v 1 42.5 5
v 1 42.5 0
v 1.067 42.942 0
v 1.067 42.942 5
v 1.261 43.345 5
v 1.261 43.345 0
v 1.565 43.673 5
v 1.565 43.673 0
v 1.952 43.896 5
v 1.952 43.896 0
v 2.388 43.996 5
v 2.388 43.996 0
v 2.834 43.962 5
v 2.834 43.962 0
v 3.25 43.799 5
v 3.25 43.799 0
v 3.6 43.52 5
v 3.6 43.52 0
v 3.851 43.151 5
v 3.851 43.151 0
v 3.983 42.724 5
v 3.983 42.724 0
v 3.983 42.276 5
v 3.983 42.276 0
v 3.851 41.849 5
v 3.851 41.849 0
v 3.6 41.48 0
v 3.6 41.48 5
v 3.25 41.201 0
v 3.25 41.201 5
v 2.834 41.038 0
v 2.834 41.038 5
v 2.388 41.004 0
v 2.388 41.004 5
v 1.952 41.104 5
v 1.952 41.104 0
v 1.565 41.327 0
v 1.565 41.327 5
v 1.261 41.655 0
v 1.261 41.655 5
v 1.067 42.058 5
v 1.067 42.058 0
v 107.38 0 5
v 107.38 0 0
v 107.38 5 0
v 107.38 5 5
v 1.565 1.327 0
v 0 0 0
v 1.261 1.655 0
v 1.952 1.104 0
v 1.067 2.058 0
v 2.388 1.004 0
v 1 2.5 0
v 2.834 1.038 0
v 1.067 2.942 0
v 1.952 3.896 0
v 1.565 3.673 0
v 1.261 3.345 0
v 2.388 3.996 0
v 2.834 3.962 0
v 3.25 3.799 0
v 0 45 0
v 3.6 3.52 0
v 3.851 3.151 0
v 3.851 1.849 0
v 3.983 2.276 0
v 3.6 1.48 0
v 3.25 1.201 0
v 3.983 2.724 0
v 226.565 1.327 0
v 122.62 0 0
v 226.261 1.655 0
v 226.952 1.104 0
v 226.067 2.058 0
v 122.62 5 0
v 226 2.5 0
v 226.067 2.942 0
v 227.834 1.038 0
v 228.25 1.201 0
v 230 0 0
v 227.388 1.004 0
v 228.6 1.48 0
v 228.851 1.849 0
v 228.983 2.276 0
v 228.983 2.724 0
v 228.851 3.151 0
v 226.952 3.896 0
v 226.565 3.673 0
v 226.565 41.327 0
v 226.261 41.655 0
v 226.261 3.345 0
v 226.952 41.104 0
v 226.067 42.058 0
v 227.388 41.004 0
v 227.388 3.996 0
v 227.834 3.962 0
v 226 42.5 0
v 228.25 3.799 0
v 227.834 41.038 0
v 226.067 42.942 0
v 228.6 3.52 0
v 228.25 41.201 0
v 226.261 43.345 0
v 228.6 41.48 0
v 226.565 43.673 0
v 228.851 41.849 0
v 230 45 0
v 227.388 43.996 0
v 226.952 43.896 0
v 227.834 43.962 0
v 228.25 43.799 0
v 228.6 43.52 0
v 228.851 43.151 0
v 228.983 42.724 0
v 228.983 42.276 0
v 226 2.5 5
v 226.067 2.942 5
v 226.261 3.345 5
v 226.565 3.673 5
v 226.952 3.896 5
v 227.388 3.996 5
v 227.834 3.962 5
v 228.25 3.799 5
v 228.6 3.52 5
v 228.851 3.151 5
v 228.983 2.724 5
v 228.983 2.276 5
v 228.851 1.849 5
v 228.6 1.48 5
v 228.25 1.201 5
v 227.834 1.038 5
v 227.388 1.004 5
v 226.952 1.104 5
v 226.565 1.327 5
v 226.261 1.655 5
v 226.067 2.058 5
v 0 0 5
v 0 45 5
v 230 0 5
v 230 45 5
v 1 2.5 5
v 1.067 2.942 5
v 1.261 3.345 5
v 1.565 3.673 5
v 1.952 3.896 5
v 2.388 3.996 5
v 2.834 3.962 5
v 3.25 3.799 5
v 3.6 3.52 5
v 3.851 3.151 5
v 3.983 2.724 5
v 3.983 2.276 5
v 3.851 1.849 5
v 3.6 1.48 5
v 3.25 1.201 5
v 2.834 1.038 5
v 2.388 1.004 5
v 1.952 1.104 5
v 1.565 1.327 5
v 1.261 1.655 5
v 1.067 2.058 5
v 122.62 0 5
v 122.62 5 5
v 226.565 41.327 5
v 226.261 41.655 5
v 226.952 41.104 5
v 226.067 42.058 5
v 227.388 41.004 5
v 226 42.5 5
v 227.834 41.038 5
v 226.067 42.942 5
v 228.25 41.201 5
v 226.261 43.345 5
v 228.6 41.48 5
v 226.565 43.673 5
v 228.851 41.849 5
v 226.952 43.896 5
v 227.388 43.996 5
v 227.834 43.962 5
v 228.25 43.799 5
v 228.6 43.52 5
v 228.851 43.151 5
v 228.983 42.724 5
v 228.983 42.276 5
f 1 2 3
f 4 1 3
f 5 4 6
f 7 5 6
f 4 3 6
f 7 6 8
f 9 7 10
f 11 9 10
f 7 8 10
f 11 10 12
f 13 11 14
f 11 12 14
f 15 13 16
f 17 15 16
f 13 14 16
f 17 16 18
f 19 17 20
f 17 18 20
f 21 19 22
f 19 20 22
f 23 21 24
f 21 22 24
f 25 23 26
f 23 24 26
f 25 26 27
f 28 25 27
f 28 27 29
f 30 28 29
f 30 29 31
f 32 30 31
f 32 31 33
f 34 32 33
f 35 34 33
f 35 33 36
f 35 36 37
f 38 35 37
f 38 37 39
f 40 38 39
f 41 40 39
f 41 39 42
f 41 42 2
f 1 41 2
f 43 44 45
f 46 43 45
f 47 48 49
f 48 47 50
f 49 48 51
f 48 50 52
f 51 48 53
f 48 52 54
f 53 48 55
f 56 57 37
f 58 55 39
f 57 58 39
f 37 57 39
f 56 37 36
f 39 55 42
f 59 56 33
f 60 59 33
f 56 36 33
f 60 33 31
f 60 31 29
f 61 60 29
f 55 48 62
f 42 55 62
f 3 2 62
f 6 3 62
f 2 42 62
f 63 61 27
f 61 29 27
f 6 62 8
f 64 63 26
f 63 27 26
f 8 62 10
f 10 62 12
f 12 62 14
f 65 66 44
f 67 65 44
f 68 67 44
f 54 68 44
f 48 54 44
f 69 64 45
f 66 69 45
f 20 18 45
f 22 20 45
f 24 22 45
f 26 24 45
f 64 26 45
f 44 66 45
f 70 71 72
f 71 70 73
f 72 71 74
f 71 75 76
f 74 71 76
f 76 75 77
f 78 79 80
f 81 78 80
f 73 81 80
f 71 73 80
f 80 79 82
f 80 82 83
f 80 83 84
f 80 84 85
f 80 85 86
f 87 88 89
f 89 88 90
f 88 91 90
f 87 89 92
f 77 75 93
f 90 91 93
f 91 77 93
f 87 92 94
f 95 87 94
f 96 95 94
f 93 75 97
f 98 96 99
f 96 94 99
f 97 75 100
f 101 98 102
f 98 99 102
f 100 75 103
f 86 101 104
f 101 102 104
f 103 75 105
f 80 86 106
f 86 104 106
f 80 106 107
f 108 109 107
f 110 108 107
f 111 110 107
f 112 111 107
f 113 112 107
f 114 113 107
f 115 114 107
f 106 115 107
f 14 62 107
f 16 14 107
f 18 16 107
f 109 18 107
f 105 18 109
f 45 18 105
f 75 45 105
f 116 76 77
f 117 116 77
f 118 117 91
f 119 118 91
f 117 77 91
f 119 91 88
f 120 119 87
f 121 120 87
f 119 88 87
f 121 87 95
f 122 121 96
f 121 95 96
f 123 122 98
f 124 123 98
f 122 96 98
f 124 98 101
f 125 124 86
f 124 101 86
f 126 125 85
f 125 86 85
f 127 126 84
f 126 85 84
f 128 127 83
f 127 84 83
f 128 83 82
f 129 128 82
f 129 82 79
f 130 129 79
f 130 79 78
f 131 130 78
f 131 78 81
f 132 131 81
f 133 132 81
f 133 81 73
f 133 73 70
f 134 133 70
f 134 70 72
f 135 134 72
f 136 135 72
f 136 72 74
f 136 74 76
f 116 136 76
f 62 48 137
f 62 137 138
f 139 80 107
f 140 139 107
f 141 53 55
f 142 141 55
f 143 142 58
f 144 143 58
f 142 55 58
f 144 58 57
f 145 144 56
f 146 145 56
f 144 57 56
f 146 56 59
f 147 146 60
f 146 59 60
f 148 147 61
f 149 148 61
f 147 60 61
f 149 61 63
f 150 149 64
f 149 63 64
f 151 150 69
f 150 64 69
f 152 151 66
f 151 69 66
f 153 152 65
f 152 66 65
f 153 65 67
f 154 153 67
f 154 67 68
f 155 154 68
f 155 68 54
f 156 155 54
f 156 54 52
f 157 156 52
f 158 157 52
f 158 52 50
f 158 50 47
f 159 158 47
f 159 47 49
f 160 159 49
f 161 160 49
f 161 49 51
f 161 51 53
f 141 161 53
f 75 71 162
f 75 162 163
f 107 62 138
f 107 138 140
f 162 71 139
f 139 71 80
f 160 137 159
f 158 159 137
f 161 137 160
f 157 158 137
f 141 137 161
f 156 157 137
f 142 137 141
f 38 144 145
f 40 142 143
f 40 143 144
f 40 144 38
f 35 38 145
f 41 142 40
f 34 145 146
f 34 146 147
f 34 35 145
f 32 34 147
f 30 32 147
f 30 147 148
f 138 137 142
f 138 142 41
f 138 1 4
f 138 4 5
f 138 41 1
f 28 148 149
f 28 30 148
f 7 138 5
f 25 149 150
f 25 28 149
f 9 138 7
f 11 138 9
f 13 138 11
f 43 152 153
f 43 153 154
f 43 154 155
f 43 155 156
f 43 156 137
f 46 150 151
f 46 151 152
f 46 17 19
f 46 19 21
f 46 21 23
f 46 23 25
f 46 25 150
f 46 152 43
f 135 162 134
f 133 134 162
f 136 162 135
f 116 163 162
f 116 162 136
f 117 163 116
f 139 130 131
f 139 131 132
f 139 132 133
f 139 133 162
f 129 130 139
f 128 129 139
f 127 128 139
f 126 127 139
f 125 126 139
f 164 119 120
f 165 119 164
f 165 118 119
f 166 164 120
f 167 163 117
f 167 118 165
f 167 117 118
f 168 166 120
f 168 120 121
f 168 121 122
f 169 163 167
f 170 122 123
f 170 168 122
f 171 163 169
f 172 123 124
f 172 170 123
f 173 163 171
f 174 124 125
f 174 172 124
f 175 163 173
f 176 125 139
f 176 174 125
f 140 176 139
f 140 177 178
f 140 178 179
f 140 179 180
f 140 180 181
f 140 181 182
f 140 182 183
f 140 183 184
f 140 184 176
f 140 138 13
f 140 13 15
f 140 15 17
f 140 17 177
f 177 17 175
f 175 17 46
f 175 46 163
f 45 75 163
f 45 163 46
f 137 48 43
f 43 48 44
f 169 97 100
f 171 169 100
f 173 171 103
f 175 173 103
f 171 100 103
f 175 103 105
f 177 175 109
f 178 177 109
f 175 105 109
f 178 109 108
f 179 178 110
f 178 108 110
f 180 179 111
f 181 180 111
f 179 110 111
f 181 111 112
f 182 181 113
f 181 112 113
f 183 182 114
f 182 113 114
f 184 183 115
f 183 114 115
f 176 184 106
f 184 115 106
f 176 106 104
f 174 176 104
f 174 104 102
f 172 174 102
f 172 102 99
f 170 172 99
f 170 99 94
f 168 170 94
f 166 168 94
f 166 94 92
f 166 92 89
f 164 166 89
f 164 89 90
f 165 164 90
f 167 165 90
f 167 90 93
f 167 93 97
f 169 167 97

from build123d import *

# Parameters (mm, degrees)
SKETCH1_W           = 230
SKETCH1_H           = 45
BOSS_EXTRUDE1_DEPTH = 5
SKETCH2_R           = 1.5
CUT_EXTRUDE1_DEPTH  = 10
SKETCH3_W           = 15.24
SKETCH3_H           = 10
CUT_EXTRUDE2_DEPTH  = 5


with BuildPart() as part:
    # Sketch1 → Boss-Extrude1 (new body)
    with BuildSketch(Plane.XY):
        with Locations((115, 22.5)):
            Rectangle(SKETCH1_W, SKETCH1_H)
    extrude(amount=BOSS_EXTRUDE1_DEPTH)

    # Sketch2 → Cut-Extrude1 (cut)
    with BuildSketch(Plane(origin=(0, 0, 0), x_dir=(-1, 0, 0), z_dir=(0, 0, -1))):
        with Locations((-227.5, 42.5)):
            Circle(SKETCH2_R)
        with Locations((-227.5, 2.5)):
            Circle(SKETCH2_R)
        with Locations((-2.5, 2.5)):
            Circle(SKETCH2_R)
        with Locations((-2.5, 42.5)):
            Circle(SKETCH2_R)
    extrude(amount=-CUT_EXTRUDE1_DEPTH, mode=Mode.SUBTRACT)

    # Sketch3 → Cut-Extrude2 (cut)
    with BuildSketch(Plane(origin=(0, 0, 0), x_dir=(-1, 0, 0), z_dir=(0, 0, -1))):
        with Locations((-115, 0)):
            Rectangle(SKETCH3_W, SKETCH3_H)
    extrude(amount=-CUT_EXTRUDE2_DEPTH, mode=Mode.SUBTRACT)


solid = part.part
